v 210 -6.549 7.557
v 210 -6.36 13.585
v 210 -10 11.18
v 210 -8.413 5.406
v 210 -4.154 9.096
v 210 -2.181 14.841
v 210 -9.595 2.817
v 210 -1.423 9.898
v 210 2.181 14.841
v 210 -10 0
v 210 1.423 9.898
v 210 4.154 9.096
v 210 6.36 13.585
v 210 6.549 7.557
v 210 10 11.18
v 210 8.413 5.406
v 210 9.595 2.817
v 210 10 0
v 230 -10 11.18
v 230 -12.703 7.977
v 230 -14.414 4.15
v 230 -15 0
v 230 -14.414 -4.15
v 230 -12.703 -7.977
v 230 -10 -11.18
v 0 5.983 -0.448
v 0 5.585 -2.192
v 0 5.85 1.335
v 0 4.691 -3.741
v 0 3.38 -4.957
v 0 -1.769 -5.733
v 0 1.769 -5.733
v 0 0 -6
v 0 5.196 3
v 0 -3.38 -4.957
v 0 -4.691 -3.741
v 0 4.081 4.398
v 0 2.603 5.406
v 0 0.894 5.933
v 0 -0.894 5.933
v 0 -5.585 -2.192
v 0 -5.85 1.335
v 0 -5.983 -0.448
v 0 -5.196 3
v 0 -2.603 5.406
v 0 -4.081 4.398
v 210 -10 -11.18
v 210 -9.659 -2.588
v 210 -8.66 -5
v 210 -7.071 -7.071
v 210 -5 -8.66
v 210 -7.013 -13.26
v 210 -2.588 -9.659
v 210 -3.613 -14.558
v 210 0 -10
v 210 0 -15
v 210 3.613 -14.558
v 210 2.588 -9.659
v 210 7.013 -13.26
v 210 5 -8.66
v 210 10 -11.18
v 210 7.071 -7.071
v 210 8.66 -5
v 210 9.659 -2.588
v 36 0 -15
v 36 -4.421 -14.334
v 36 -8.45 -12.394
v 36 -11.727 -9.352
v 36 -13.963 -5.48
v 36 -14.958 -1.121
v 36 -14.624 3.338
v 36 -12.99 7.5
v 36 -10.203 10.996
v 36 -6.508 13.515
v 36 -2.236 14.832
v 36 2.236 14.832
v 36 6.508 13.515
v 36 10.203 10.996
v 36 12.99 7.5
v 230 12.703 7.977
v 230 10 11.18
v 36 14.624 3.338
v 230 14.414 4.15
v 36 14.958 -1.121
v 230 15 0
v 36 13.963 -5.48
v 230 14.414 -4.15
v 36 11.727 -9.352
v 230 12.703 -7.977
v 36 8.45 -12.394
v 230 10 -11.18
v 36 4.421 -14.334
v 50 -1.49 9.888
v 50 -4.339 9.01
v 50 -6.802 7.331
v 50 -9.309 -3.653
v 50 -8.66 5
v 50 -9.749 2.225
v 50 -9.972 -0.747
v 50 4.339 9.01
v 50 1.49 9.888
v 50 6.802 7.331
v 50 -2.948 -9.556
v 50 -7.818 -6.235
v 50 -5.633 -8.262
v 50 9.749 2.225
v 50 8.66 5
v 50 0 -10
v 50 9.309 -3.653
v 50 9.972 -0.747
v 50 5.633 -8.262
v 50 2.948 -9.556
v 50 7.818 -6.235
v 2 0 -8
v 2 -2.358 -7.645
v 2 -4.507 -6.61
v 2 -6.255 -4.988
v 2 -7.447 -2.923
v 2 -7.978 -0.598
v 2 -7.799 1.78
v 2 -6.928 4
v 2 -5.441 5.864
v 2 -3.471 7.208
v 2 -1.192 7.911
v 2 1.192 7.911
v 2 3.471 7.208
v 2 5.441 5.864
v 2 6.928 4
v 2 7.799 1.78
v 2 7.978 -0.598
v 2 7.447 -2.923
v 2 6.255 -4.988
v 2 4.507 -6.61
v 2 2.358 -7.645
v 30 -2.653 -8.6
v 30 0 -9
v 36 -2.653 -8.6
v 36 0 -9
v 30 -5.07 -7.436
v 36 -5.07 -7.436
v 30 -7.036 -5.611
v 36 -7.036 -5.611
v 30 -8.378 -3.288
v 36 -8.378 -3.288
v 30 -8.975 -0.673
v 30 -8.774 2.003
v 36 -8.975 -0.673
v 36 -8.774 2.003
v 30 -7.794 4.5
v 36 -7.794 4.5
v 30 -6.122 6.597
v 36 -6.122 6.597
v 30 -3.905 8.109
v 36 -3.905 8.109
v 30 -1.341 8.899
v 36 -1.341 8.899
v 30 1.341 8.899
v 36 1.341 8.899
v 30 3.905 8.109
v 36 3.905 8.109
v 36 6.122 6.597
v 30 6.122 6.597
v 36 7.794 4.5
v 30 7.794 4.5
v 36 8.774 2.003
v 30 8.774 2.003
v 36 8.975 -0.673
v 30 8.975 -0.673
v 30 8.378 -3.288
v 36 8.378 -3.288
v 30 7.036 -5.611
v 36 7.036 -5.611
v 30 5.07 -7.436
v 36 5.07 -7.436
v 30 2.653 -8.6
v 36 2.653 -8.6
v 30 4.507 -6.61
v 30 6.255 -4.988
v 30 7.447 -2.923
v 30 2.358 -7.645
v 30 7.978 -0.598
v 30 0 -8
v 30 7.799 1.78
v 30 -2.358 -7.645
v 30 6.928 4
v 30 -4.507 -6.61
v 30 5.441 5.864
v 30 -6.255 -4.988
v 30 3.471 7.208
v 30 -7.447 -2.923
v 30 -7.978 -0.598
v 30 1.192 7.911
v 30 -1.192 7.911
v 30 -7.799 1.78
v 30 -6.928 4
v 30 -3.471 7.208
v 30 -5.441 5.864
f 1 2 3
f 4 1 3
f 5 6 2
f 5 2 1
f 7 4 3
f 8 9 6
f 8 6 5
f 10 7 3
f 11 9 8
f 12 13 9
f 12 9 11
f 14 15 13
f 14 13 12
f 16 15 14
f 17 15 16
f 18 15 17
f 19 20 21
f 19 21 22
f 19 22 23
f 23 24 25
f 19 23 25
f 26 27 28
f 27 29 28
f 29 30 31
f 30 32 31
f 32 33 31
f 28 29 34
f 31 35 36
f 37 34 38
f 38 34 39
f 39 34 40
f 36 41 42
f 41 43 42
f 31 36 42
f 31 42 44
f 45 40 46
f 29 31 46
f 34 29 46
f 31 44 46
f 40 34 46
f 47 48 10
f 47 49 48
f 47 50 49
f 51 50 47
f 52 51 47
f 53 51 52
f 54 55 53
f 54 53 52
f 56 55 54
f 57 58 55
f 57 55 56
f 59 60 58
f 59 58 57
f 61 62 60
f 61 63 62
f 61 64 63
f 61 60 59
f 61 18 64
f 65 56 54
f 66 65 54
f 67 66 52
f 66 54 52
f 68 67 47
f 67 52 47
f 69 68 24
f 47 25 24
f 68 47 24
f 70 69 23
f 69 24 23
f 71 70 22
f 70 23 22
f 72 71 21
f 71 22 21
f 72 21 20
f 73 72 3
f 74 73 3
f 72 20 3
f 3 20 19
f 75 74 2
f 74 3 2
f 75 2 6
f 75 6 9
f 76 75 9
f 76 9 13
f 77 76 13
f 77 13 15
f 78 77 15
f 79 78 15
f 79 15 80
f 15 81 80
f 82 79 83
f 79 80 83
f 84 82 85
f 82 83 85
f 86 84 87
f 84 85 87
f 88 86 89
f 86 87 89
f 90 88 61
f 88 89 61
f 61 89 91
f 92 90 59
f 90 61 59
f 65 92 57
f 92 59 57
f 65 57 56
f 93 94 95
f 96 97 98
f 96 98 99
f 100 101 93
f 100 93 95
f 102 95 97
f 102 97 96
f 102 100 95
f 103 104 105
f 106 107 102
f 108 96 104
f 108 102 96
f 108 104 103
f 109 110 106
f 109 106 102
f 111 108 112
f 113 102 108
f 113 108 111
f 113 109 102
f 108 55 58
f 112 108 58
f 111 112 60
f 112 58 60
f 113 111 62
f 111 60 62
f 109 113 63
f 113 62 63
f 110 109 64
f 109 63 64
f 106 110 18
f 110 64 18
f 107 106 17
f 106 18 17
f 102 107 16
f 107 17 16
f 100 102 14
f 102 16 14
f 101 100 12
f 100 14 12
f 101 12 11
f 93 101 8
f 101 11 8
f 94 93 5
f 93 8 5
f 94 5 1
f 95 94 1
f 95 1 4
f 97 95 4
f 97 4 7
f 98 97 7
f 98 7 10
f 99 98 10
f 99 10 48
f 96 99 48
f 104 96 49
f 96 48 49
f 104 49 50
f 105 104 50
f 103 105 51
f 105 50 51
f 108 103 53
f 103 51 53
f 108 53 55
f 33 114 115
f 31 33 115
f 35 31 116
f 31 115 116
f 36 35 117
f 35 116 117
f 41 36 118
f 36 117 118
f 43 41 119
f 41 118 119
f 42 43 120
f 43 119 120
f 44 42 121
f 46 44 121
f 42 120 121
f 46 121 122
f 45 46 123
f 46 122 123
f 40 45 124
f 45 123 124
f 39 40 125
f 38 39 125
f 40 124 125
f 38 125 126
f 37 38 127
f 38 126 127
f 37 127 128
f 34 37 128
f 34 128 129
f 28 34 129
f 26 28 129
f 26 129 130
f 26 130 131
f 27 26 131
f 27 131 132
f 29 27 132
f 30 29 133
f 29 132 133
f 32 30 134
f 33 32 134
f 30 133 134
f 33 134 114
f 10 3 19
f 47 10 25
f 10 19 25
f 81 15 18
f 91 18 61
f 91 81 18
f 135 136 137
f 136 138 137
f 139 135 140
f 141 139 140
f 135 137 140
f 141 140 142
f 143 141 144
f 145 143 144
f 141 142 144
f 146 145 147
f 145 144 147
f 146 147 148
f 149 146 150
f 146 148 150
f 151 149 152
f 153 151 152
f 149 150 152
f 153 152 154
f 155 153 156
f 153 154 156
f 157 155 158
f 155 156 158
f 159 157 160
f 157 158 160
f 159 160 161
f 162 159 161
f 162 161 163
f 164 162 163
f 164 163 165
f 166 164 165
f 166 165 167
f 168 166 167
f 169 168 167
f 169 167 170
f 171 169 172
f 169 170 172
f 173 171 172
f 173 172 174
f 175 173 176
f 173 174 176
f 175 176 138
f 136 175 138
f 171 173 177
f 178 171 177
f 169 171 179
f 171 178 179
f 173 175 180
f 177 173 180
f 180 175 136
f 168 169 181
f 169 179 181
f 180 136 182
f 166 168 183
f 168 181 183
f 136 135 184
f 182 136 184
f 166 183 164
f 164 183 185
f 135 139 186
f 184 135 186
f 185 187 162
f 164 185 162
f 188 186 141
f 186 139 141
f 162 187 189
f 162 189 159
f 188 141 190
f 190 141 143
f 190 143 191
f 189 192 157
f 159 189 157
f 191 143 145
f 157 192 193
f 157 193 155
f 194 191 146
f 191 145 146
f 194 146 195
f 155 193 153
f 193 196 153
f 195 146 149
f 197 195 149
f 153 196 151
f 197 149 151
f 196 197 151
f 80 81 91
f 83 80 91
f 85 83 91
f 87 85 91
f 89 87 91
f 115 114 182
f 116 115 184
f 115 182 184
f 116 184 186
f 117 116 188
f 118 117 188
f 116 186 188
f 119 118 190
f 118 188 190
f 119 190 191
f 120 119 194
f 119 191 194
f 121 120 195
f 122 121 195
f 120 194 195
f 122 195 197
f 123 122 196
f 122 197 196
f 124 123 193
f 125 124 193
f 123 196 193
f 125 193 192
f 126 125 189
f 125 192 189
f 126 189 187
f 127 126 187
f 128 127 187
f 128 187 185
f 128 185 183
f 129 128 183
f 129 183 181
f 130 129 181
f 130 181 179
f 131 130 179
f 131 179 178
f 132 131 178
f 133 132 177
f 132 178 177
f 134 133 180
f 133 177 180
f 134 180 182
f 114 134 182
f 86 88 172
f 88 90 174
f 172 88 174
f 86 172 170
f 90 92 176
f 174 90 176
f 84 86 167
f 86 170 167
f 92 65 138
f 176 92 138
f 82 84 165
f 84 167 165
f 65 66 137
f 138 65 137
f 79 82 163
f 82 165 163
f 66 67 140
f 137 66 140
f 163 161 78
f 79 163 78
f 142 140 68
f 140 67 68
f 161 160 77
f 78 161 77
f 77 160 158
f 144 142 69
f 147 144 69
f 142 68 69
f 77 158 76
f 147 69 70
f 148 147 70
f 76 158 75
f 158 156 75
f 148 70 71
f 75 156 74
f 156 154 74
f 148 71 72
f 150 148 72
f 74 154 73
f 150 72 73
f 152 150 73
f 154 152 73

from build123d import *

# Parameters (mm, degrees)
CHAMFER_1_SIZE = 2
SKETCH1_W      = 30
SKETCH1_H      = 20
EXTRUDE1_DEPTH = 20
SKETCH2_R      = 10
EXTRUDE3_DEPTH = 160


with BuildPart() as part:
    # Эскиз1 → Повернуть1 (revolve)
    with BuildSketch(Plane.XY, mode=Mode.PRIVATE) as revolve_1_sk:
        Polygon((0, 0), (0, 8), (30, 8), (30, 9), (36, 9), (36, 15), (230, 15), (230, 0), align=None)
    revolve(revolve_1_sk.sketch.rotate(Axis((0, 0, 0), (-1, 0, 0)), 90), axis=Axis((0, 0, 0), (-1, 0, 0)))

    # Фаска1
    chamfer_1_edges = [part.edges().sort_by_distance(p)[0] for p in [
        (0, 0, 8),
    ]]
    chamfer(chamfer_1_edges, length=CHAMFER_1_SIZE)

    # Sketch1 → Extrude1 (cut)
    with BuildSketch(Plane(origin=(230, 0, 0), x_dir=(0, 0, -1), z_dir=(1, 0, 0))):
        Rectangle(SKETCH1_W, SKETCH1_H)
    extrude(amount=-EXTRUDE1_DEPTH, mode=Mode.SUBTRACT)

    # Sketch2 → Extrude3 (cut)
    with BuildSketch(Plane(origin=(210, 0, 0), x_dir=(0, 0, -1), z_dir=(1, 0, 0))):
        Circle(SKETCH2_R)
    extrude(amount=-EXTRUDE3_DEPTH, mode=Mode.SUBTRACT)


solid = part.part
